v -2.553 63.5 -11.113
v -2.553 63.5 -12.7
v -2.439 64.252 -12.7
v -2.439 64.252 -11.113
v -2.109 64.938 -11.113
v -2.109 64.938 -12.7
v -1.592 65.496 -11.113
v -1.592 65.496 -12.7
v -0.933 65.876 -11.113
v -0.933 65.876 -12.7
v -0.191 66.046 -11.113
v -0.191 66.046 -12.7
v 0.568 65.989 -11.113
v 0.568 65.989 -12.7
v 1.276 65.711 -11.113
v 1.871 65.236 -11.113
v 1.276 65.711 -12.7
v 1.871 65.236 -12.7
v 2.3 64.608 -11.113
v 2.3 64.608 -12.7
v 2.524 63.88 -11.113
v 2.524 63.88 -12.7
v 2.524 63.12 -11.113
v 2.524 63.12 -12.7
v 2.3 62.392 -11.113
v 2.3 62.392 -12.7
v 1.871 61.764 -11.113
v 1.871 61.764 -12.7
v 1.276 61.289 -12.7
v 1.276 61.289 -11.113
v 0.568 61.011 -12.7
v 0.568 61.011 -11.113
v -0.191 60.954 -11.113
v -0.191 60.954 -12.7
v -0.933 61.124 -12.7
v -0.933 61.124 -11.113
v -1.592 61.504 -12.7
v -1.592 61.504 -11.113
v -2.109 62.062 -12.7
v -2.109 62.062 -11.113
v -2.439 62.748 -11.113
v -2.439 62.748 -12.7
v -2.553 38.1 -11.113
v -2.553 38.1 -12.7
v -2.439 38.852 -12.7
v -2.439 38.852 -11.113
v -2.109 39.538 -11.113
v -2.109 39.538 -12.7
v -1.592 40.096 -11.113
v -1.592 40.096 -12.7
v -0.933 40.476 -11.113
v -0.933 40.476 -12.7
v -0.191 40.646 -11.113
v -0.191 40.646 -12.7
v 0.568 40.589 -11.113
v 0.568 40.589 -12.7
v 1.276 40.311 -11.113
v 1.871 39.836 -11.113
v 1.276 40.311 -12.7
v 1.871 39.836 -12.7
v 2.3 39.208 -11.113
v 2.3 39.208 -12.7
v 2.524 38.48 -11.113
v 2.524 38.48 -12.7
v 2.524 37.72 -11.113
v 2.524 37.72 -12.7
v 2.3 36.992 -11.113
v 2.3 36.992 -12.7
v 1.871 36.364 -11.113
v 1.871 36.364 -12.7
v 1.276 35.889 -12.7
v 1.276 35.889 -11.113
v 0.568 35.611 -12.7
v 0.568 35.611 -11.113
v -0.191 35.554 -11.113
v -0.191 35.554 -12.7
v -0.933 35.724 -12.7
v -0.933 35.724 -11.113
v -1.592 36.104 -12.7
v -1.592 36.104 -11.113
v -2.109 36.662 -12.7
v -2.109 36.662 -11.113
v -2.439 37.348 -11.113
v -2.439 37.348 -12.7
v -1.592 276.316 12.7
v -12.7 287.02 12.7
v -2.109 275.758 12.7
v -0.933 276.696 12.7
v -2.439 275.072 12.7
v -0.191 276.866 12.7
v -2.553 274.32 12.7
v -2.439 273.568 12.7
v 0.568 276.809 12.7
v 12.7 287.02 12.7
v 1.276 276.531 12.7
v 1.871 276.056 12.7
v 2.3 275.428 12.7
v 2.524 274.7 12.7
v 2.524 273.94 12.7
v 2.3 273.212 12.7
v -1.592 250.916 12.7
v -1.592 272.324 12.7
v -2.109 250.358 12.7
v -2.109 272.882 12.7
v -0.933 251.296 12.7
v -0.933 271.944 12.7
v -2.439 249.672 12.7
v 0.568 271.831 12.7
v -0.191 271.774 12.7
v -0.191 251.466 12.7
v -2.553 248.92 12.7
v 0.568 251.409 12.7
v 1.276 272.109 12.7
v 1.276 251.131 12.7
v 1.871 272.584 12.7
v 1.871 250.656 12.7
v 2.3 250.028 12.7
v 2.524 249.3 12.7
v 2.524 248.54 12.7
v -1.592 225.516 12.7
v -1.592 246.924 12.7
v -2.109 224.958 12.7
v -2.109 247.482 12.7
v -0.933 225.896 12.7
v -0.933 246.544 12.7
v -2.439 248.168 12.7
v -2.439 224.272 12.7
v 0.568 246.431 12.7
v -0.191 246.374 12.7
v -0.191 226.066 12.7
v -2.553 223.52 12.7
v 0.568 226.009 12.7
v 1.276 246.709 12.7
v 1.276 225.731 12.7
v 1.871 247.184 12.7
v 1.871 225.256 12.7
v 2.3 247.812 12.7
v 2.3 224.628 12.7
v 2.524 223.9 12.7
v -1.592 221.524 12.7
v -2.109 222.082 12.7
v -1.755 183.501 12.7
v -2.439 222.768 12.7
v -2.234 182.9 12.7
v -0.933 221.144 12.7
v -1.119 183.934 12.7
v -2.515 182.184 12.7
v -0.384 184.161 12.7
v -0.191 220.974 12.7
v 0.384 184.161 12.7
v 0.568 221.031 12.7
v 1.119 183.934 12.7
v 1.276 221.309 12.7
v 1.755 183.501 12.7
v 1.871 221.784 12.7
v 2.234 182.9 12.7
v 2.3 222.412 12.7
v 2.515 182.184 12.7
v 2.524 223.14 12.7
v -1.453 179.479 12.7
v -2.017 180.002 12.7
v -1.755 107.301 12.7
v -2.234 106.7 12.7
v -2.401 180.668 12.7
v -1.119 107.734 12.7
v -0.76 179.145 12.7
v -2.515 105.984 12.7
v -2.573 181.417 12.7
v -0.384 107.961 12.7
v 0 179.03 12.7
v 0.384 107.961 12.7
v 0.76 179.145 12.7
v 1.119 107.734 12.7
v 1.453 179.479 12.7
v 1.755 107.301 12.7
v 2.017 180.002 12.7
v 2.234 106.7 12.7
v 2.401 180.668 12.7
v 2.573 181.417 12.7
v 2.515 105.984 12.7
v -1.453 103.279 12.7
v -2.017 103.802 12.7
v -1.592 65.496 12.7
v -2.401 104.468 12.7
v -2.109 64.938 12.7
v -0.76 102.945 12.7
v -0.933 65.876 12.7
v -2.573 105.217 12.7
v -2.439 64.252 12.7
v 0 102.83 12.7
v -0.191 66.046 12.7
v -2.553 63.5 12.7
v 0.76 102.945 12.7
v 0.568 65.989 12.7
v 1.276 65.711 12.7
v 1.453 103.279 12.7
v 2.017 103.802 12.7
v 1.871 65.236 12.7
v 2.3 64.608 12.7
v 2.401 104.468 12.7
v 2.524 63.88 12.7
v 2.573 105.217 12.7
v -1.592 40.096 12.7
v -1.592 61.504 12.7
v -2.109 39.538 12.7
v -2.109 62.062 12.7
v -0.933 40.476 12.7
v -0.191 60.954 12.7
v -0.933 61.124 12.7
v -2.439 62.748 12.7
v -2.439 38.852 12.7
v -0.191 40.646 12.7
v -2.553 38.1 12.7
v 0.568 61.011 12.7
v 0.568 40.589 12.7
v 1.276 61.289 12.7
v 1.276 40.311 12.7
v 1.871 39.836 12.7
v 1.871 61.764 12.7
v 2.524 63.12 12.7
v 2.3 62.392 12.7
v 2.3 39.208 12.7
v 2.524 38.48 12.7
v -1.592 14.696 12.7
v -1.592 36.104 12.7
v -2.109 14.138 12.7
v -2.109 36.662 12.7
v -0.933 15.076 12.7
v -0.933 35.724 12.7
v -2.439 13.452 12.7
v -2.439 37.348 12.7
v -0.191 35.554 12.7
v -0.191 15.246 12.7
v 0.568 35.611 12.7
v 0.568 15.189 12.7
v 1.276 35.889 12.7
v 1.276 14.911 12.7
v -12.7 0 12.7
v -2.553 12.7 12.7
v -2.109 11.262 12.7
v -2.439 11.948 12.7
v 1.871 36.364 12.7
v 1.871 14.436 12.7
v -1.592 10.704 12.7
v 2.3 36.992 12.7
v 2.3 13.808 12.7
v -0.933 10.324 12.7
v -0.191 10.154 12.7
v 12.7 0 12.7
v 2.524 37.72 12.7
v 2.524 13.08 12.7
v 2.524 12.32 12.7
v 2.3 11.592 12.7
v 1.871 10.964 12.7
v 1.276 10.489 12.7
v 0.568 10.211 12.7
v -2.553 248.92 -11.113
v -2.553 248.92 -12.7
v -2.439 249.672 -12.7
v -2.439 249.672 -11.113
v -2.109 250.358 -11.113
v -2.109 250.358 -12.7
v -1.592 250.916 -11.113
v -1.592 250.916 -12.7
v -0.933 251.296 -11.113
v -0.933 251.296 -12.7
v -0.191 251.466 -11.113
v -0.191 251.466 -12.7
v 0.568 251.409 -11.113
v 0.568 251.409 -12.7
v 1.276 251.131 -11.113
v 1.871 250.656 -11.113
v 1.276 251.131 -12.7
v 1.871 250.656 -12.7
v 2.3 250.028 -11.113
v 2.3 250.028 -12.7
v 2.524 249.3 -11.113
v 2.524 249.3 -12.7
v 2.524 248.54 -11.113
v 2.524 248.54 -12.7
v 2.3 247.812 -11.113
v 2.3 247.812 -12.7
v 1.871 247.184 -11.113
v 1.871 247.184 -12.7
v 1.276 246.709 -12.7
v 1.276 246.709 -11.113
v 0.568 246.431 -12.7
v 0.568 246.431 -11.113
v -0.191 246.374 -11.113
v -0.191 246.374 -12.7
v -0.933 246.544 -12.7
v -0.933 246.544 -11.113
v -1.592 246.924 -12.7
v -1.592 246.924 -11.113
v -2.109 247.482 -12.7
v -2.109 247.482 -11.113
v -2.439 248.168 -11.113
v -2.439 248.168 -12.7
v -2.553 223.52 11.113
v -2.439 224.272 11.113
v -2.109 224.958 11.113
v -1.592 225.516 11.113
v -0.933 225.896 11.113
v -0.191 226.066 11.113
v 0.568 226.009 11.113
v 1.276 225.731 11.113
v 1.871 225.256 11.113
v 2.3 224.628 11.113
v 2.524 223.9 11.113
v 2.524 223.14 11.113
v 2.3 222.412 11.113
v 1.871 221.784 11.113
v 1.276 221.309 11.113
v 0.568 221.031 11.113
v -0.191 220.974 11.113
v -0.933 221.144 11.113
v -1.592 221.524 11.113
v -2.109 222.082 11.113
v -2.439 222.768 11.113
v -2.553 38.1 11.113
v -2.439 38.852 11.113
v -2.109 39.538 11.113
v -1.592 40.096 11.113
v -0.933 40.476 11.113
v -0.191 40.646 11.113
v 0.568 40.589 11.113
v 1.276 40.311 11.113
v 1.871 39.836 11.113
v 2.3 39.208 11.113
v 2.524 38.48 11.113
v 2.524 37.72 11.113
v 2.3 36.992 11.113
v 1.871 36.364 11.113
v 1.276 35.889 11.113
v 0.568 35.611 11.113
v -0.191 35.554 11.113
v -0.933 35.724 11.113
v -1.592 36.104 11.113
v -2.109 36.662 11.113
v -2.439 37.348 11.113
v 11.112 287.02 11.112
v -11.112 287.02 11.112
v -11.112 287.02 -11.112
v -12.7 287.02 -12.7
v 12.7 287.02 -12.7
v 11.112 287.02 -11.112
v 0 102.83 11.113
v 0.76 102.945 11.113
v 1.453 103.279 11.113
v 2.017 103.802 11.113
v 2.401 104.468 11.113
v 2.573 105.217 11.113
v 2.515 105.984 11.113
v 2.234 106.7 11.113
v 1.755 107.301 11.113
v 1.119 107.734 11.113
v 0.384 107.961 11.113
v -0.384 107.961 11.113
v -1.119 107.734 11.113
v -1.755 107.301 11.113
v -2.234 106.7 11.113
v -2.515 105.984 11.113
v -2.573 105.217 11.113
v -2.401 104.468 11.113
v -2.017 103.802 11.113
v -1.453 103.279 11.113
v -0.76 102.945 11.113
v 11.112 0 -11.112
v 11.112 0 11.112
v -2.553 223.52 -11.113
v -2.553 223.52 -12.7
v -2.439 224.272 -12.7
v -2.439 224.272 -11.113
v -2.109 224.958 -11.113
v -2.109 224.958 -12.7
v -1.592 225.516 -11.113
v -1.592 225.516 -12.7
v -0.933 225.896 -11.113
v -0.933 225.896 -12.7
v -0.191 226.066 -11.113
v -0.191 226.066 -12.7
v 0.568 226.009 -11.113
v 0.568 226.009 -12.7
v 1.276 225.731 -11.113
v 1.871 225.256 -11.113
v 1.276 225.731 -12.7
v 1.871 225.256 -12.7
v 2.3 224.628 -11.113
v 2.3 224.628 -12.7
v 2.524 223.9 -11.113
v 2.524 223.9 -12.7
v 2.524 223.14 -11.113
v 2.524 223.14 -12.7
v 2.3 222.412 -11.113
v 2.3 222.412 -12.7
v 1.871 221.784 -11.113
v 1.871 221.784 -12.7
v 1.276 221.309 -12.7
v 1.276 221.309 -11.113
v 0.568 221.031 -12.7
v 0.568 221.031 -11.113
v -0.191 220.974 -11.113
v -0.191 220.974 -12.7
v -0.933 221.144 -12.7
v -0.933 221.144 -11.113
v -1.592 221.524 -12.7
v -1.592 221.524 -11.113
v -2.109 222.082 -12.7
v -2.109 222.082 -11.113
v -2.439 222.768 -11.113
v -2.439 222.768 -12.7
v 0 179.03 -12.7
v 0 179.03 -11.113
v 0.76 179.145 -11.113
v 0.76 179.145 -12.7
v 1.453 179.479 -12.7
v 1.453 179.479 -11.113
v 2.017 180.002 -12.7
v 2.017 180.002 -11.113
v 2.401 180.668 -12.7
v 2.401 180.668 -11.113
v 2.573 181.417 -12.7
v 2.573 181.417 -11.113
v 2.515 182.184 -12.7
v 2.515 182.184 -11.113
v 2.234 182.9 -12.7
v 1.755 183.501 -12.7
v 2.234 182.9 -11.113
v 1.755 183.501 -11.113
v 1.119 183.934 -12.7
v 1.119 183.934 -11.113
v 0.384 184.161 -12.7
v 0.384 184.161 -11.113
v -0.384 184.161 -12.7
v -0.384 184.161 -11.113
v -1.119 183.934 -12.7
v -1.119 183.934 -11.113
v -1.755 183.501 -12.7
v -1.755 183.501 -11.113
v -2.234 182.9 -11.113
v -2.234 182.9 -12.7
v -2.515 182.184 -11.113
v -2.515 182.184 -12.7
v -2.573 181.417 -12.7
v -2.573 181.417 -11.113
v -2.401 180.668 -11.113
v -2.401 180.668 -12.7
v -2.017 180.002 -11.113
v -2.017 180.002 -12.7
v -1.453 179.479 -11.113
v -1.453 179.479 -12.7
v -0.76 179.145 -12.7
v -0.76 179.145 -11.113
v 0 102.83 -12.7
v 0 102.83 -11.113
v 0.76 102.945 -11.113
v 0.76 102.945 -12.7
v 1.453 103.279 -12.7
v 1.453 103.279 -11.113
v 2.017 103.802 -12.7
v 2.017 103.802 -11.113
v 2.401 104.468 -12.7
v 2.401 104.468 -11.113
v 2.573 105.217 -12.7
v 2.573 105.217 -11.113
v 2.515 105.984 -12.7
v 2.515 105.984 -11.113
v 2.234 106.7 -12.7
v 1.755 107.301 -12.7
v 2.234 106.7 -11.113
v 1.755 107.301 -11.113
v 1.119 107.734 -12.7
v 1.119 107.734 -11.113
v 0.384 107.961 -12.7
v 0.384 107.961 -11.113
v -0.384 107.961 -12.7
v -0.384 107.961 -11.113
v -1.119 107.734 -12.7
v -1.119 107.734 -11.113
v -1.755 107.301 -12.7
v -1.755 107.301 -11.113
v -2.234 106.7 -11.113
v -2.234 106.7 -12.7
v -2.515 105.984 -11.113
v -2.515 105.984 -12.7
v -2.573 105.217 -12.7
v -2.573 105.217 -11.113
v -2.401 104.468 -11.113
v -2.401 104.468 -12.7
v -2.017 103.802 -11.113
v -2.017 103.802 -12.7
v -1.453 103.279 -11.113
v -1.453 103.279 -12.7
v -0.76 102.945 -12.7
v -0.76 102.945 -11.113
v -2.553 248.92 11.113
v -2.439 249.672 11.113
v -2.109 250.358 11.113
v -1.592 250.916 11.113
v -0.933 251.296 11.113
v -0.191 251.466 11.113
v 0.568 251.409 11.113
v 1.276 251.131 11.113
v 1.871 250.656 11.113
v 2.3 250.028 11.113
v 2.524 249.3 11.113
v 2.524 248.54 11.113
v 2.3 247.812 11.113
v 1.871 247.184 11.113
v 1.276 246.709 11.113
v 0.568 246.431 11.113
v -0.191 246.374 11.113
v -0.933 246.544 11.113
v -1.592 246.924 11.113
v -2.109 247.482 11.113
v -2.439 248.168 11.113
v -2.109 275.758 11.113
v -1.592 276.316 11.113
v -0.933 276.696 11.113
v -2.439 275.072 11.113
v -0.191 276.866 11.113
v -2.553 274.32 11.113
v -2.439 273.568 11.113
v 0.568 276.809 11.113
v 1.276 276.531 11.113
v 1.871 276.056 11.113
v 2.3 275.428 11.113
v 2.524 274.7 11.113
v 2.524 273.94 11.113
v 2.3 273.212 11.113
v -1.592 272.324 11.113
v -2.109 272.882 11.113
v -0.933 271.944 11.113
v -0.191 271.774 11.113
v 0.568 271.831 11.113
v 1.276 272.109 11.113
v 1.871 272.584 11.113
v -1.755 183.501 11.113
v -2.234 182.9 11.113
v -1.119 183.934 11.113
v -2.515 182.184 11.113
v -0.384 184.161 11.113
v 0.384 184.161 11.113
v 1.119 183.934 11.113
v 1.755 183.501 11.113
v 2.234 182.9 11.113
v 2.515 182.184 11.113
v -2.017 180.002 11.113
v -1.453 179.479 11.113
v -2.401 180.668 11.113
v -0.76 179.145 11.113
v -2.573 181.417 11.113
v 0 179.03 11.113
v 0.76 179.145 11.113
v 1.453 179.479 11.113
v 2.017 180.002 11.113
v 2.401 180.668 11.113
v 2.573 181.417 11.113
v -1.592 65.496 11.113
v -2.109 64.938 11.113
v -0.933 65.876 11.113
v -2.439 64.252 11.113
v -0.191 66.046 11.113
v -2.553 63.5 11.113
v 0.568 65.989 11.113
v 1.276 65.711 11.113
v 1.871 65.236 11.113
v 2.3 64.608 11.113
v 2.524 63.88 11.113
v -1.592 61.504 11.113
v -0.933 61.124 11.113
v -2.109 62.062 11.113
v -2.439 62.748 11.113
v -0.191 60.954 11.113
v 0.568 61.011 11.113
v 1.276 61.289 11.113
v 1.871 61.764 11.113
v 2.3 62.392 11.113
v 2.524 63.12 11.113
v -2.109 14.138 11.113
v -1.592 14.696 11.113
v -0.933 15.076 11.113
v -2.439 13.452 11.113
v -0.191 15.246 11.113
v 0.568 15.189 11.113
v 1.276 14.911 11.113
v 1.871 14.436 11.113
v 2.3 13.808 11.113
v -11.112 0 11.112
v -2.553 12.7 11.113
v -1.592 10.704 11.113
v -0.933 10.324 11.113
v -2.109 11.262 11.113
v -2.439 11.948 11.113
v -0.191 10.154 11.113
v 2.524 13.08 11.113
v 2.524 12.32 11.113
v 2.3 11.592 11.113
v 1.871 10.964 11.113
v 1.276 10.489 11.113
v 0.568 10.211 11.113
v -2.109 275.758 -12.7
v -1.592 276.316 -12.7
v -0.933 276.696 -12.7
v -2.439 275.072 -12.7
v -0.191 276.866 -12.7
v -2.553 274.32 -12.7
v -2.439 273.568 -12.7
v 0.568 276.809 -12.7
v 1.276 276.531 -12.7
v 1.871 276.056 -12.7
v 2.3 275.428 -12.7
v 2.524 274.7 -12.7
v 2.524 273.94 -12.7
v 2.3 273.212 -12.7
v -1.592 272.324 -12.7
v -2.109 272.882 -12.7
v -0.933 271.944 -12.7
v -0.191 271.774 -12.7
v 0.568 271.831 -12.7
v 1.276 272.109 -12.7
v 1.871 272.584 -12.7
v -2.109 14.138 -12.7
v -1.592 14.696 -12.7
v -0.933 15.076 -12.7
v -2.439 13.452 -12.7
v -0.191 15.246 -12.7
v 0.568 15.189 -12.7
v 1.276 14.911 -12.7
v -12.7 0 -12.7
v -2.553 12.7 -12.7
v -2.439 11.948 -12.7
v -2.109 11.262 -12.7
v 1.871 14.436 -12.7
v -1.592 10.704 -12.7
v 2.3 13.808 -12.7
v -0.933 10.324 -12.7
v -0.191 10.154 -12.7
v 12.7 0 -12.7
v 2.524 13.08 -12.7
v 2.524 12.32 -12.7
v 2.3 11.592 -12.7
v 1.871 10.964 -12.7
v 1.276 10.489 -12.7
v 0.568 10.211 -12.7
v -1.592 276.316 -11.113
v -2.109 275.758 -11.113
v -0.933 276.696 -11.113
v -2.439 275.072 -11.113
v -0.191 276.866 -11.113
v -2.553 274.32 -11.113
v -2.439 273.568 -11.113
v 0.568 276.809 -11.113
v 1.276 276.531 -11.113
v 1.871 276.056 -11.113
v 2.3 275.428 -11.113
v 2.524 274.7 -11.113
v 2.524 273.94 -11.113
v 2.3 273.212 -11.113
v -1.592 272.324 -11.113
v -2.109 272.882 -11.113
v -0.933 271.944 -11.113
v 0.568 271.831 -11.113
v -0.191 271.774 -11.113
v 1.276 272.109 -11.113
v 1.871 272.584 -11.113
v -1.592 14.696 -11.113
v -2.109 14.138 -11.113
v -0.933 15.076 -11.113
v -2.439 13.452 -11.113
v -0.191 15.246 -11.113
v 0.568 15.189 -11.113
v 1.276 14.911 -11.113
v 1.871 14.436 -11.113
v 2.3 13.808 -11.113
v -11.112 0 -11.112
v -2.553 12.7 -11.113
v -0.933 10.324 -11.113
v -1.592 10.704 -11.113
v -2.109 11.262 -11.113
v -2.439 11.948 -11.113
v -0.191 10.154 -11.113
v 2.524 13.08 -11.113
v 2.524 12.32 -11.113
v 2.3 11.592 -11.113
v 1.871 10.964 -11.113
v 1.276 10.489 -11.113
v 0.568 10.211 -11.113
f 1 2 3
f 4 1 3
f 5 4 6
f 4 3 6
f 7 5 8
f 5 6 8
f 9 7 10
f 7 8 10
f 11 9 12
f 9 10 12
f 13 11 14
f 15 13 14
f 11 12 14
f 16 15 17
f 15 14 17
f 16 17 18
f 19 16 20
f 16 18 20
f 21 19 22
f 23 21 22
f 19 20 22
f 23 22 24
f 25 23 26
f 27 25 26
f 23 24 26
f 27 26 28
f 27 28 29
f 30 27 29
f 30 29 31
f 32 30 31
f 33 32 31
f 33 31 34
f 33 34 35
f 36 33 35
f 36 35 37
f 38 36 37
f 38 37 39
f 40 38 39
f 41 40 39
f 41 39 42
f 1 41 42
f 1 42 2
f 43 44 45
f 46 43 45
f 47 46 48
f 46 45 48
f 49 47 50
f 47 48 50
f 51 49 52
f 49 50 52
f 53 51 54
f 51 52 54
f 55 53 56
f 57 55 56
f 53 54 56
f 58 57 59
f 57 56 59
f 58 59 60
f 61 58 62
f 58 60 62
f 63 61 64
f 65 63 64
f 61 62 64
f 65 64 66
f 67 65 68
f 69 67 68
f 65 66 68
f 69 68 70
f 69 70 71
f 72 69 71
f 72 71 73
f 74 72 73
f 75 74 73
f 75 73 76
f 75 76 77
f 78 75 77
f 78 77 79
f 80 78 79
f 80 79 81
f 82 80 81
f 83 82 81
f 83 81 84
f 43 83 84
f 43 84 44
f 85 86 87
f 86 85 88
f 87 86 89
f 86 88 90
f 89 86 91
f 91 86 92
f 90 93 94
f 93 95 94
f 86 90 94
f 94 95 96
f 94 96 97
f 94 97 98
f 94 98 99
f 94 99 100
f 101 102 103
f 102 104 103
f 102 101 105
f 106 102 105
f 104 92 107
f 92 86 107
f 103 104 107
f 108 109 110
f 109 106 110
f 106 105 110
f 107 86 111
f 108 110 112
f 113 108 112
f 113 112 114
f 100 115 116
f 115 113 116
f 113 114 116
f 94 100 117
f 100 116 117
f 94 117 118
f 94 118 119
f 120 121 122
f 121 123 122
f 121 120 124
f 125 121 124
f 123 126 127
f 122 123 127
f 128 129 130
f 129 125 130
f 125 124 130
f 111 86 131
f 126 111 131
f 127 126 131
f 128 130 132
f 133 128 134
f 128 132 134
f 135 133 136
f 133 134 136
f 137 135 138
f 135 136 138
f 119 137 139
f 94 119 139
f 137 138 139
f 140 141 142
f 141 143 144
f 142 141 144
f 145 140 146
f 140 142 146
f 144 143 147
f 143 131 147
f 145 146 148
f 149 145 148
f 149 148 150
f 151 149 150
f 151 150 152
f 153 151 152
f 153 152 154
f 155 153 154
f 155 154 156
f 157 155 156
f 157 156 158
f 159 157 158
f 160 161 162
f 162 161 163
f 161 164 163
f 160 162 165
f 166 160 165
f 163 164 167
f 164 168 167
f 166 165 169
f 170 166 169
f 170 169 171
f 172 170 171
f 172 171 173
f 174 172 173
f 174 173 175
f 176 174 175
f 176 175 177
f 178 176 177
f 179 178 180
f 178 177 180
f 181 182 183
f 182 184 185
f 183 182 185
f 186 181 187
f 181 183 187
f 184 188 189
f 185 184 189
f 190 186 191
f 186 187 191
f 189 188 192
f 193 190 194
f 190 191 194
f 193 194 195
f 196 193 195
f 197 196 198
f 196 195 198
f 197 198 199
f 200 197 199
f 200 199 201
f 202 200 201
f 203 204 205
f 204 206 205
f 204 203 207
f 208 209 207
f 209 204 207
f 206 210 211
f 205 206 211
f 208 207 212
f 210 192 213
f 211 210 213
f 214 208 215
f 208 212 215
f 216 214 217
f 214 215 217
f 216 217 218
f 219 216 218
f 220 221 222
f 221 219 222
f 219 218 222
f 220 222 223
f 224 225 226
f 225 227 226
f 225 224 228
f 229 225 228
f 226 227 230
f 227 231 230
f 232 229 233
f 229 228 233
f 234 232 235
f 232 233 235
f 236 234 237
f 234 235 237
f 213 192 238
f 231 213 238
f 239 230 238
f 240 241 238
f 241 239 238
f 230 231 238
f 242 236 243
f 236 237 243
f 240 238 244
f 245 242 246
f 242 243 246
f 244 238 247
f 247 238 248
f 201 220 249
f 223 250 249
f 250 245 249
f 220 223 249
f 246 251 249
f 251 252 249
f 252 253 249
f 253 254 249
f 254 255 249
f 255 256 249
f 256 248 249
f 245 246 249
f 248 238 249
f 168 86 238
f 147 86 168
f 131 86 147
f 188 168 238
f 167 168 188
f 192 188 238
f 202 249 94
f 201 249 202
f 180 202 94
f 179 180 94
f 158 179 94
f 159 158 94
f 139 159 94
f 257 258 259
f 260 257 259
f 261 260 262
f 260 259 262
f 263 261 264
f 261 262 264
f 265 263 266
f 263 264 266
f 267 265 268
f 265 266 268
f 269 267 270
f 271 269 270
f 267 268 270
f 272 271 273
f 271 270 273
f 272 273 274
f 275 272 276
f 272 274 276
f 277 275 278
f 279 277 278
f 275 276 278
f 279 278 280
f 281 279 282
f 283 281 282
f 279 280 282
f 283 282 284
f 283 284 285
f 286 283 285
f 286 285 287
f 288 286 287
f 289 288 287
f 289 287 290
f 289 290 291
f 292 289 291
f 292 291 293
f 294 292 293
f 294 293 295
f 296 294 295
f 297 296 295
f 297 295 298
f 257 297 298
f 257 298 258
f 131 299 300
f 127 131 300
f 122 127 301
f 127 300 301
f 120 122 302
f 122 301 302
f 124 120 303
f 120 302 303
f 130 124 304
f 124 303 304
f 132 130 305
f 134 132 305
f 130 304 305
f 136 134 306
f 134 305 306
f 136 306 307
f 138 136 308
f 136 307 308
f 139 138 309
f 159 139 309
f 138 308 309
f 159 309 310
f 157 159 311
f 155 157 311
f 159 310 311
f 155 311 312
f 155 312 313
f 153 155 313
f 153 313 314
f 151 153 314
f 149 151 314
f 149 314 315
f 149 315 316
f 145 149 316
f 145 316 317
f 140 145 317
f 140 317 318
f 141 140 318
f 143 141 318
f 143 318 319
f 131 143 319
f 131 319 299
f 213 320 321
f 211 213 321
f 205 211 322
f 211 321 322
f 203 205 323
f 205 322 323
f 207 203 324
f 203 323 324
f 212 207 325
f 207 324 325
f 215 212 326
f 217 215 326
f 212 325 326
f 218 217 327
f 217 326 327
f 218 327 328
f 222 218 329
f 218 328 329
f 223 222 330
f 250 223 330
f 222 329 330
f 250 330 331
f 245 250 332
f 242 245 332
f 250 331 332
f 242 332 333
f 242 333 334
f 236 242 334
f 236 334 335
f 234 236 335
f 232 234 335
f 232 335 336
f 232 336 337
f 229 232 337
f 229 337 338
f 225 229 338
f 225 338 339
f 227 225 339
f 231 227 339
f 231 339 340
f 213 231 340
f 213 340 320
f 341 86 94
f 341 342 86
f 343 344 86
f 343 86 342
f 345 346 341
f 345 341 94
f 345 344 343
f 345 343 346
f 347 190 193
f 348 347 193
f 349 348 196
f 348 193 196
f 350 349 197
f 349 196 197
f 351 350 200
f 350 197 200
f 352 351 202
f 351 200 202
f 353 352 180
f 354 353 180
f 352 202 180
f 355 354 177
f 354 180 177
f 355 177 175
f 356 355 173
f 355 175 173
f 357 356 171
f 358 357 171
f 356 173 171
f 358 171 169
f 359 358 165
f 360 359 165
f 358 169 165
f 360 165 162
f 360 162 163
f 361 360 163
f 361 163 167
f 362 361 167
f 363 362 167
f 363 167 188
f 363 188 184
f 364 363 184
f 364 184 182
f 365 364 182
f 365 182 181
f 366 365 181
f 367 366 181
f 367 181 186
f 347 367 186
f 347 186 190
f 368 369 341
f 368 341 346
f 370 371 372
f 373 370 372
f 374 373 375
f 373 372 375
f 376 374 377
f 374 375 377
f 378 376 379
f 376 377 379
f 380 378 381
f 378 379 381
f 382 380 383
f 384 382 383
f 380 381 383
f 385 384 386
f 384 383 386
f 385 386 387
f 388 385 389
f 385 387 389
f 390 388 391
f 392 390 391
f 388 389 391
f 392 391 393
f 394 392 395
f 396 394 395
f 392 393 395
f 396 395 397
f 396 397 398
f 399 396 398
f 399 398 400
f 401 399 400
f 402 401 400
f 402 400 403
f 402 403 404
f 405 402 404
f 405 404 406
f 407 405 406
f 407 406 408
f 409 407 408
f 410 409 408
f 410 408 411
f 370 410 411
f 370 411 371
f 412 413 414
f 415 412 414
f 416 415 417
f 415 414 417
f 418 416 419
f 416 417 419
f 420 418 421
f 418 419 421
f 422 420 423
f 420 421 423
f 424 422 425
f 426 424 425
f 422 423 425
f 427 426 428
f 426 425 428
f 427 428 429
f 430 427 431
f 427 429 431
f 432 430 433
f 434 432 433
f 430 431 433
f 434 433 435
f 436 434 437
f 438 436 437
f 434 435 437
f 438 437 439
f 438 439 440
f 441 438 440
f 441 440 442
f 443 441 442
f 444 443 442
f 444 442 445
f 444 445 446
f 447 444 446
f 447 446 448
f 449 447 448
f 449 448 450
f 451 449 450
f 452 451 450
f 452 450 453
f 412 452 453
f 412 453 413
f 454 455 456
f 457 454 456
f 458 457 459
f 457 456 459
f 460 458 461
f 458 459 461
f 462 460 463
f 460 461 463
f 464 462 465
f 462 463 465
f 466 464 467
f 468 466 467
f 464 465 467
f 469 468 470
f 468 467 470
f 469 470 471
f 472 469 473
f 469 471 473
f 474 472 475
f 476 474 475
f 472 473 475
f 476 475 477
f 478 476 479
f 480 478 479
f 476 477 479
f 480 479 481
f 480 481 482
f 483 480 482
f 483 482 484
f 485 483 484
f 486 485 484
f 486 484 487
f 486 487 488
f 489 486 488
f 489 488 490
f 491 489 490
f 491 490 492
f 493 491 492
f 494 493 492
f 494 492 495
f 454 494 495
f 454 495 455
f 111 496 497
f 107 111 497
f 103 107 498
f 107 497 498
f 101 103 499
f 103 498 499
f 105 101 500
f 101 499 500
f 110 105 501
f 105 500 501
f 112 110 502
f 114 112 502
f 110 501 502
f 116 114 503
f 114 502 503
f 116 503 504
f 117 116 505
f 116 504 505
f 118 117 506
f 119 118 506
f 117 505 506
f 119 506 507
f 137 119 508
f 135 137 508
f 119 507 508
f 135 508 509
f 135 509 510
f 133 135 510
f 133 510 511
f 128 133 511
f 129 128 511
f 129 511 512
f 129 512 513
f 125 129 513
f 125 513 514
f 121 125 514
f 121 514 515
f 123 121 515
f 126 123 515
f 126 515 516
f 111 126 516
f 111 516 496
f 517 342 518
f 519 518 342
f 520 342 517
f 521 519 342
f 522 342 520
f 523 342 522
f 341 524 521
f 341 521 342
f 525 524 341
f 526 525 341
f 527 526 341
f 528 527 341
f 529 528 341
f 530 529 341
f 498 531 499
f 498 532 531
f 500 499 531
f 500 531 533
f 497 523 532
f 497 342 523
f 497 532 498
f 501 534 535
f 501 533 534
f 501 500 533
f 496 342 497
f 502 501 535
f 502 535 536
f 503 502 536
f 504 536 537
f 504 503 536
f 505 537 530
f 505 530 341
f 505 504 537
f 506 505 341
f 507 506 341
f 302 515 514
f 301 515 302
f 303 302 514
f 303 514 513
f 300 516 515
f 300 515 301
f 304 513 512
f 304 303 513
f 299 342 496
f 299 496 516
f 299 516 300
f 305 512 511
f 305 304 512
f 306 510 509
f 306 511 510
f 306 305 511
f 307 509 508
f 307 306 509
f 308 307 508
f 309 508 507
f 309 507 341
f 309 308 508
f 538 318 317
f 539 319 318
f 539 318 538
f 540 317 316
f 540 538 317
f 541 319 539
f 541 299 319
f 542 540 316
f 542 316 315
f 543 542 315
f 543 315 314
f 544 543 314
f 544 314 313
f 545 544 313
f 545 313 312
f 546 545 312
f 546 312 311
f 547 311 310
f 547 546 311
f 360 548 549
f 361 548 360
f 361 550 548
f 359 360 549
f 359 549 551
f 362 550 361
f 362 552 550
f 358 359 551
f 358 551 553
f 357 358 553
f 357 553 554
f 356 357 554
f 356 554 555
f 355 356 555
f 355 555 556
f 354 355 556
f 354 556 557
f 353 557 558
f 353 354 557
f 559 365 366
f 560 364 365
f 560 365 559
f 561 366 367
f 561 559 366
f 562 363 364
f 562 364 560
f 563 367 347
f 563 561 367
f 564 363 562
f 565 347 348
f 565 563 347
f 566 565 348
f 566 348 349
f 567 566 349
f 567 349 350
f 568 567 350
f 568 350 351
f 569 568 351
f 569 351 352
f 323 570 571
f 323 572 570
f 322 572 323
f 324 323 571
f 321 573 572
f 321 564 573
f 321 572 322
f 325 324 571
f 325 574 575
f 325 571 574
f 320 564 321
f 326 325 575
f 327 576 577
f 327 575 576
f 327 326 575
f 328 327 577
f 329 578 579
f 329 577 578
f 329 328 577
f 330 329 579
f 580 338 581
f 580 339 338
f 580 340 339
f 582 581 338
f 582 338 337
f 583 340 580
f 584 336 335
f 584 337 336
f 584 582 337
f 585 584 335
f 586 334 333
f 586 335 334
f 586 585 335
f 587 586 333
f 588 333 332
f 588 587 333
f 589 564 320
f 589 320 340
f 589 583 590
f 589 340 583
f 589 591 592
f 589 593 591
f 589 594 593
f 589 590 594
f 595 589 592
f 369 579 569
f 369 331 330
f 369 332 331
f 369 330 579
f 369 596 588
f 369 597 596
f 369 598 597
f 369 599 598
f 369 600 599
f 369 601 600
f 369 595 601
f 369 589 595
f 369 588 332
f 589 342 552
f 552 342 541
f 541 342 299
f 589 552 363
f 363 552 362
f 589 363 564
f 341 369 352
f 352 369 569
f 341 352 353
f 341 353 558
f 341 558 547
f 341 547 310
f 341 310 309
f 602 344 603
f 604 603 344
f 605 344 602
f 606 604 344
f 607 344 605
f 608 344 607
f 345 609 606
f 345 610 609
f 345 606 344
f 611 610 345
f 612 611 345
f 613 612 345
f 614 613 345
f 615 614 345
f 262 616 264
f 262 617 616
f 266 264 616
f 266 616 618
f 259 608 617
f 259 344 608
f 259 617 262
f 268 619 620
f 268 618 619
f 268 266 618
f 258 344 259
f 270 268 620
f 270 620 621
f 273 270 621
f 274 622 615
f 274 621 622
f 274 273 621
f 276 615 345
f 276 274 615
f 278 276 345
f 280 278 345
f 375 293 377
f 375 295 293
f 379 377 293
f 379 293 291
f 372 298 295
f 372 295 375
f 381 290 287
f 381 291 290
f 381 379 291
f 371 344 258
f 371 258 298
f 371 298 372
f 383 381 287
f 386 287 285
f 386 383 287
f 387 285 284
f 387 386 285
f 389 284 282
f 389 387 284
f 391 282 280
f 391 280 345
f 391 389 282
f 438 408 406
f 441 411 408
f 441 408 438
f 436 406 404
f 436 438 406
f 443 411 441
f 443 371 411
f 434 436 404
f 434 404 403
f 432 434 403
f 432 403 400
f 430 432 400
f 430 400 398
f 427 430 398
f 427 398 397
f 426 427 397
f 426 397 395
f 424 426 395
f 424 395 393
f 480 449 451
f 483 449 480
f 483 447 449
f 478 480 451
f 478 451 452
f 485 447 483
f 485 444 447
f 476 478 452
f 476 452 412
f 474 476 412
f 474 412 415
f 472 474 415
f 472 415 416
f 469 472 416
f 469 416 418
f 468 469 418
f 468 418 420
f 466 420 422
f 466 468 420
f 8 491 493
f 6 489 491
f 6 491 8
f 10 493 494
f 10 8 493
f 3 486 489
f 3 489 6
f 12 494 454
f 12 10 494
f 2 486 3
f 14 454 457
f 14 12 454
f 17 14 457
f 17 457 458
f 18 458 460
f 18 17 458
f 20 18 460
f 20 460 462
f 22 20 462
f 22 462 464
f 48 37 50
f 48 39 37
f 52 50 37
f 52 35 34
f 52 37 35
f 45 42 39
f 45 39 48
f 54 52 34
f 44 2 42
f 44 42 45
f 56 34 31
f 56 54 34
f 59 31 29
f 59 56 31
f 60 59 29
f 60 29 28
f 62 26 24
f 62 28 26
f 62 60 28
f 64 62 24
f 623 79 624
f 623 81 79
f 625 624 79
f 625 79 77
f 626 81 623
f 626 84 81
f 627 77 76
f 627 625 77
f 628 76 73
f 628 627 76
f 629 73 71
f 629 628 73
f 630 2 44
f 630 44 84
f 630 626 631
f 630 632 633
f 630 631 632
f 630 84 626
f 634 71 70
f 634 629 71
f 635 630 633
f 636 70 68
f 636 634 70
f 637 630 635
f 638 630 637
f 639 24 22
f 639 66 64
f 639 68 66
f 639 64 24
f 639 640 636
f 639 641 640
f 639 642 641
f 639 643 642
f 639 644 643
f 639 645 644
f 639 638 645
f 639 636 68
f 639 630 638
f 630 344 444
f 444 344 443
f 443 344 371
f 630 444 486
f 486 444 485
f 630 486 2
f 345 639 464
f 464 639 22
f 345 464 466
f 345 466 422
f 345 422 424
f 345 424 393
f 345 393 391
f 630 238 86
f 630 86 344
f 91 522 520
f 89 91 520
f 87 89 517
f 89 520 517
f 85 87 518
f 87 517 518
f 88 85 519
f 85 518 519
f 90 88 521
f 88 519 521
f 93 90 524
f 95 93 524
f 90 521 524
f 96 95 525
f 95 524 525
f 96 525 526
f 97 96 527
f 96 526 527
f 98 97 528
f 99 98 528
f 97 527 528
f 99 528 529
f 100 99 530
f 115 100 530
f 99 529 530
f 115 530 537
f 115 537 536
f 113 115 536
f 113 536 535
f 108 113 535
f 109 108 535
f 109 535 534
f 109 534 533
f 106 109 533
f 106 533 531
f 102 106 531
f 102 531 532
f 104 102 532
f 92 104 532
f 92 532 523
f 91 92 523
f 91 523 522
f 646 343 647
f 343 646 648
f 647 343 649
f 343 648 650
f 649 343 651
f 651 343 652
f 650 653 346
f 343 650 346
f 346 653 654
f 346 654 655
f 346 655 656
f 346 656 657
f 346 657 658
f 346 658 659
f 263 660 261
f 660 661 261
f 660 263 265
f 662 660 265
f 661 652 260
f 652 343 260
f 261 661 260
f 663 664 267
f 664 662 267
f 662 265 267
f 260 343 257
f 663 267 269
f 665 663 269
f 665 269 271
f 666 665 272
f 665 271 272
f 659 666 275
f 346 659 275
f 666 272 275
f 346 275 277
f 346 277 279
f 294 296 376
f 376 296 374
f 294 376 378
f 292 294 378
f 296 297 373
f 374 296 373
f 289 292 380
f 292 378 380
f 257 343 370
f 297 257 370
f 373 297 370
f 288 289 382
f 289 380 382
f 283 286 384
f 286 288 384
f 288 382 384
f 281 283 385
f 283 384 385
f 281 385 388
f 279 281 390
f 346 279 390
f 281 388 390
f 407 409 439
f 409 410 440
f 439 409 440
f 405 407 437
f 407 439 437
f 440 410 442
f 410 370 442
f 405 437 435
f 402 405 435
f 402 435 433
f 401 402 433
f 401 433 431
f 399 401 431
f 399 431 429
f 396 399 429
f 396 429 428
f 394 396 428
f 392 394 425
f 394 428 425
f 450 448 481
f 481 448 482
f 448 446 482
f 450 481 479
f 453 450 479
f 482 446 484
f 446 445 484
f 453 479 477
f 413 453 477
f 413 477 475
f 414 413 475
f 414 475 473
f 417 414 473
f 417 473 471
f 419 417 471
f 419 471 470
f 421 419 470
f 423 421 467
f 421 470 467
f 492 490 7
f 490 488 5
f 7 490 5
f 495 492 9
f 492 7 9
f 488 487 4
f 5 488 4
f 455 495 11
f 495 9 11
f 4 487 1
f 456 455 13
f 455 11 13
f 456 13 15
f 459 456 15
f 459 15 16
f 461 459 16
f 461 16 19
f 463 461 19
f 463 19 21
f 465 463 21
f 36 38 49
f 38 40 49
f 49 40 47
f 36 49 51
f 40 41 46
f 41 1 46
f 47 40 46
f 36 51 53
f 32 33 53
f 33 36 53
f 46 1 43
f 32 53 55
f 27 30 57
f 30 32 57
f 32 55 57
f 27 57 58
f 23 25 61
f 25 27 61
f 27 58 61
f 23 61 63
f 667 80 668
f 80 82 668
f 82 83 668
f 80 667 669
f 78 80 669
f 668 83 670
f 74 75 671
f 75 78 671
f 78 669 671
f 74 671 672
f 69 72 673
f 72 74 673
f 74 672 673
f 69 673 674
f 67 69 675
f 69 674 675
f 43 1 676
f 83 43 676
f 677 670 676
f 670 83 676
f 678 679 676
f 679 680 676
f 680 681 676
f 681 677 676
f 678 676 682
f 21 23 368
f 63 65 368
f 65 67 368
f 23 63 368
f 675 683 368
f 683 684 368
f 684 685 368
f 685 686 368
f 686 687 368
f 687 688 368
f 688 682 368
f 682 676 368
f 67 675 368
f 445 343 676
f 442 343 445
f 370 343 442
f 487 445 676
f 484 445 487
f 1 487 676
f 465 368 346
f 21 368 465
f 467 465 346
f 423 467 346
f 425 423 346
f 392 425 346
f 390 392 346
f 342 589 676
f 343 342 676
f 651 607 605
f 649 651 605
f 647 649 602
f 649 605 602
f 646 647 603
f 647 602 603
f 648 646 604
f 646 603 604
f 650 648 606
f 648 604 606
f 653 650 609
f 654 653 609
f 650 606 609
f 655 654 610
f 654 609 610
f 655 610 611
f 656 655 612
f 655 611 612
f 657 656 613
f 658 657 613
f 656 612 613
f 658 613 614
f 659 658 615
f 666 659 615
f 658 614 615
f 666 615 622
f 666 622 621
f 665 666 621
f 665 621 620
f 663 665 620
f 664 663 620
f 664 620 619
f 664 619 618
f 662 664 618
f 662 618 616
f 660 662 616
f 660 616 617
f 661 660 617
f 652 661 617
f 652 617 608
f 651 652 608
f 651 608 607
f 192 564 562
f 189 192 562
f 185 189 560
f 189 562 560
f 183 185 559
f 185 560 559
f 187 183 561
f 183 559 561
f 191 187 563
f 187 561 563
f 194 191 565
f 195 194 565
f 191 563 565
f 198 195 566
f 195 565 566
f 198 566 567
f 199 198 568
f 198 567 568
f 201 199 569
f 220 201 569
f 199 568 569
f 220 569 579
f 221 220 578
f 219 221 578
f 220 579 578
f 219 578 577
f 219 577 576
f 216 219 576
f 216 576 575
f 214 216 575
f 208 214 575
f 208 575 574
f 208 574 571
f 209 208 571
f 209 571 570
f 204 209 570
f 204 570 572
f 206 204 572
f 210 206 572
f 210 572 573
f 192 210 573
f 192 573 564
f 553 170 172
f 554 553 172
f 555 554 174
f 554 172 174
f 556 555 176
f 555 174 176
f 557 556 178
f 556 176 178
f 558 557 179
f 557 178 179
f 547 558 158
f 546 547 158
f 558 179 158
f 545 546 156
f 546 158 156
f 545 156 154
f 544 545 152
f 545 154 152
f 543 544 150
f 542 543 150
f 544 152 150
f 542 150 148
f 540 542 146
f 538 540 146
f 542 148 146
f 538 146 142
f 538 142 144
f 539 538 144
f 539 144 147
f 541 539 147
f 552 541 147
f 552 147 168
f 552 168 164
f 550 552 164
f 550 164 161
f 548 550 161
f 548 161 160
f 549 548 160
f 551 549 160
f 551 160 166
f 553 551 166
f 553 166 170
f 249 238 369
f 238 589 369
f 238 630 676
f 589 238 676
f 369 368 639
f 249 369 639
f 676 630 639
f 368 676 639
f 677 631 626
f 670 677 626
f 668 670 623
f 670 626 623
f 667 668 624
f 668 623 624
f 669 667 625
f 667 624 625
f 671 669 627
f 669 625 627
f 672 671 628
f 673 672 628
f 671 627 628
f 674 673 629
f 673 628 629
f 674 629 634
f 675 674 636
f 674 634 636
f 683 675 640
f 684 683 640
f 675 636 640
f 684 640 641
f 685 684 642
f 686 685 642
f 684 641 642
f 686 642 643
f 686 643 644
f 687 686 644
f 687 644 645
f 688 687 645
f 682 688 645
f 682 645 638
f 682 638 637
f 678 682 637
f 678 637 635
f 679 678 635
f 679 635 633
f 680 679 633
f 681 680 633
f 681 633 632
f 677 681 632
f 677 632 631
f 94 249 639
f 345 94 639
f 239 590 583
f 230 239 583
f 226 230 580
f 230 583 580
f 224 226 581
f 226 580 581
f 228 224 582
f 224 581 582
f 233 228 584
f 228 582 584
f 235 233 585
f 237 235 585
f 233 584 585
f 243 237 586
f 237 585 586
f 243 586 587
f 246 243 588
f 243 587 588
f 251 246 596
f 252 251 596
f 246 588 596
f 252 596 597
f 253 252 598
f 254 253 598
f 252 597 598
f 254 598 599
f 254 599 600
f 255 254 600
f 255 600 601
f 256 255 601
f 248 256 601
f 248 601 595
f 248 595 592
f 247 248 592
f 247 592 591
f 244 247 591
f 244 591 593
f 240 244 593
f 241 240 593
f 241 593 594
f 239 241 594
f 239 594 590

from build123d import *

# Parameters (mm, degrees)
SKETCH1_W                        = 25.4
SKETCH1_H                        = 25.4
SKETCH1_W_2                      = 22.225
SKETCH1_H_2                      = 22.225
BOSS_EXTRUDE1_DEPTH              = 287.02
F_10_CLEARANCE_HOLE1_D           = 5.1054
F_13_64_0_20313_DIAMETER_HOLE1_D = 5.159502


with BuildPart() as part:
    # Sketch1 → Boss-Extrude1 (new body)
    with BuildSketch(Plane(origin=(0, 0, 0), x_dir=(1, 0, 0), z_dir=(0, 1, 0))):
        Rectangle(SKETCH1_W, SKETCH1_H)
        Rectangle(SKETCH1_W_2, SKETCH1_H_2, mode=Mode.SUBTRACT)
    extrude(amount=BOSS_EXTRUDE1_DEPTH)

    # #10 Clearance Hole1 (through all)
    with Locations(Plane.XY.offset(12.7)):
        with Locations((0, 274.32), (0, 248.92), (0, 223.52), (0, 63.5), (0, 38.1), (0, 12.7)):
            Hole(F_10_CLEARANCE_HOLE1_D / 2)

    # 13/64 (0.20313) Diameter Hole1 (through all)
    with Locations(Plane(origin=(-522.170199168, -199.39, -12.7), x_dir=(0, 1, 0), z_dir=(0, 0, -1))):
        with Locations((304.8, 522.170199168), (381, 522.170199168)):
            Hole(F_13_64_0_20313_DIAMETER_HOLE1_D / 2)


solid = part.part
